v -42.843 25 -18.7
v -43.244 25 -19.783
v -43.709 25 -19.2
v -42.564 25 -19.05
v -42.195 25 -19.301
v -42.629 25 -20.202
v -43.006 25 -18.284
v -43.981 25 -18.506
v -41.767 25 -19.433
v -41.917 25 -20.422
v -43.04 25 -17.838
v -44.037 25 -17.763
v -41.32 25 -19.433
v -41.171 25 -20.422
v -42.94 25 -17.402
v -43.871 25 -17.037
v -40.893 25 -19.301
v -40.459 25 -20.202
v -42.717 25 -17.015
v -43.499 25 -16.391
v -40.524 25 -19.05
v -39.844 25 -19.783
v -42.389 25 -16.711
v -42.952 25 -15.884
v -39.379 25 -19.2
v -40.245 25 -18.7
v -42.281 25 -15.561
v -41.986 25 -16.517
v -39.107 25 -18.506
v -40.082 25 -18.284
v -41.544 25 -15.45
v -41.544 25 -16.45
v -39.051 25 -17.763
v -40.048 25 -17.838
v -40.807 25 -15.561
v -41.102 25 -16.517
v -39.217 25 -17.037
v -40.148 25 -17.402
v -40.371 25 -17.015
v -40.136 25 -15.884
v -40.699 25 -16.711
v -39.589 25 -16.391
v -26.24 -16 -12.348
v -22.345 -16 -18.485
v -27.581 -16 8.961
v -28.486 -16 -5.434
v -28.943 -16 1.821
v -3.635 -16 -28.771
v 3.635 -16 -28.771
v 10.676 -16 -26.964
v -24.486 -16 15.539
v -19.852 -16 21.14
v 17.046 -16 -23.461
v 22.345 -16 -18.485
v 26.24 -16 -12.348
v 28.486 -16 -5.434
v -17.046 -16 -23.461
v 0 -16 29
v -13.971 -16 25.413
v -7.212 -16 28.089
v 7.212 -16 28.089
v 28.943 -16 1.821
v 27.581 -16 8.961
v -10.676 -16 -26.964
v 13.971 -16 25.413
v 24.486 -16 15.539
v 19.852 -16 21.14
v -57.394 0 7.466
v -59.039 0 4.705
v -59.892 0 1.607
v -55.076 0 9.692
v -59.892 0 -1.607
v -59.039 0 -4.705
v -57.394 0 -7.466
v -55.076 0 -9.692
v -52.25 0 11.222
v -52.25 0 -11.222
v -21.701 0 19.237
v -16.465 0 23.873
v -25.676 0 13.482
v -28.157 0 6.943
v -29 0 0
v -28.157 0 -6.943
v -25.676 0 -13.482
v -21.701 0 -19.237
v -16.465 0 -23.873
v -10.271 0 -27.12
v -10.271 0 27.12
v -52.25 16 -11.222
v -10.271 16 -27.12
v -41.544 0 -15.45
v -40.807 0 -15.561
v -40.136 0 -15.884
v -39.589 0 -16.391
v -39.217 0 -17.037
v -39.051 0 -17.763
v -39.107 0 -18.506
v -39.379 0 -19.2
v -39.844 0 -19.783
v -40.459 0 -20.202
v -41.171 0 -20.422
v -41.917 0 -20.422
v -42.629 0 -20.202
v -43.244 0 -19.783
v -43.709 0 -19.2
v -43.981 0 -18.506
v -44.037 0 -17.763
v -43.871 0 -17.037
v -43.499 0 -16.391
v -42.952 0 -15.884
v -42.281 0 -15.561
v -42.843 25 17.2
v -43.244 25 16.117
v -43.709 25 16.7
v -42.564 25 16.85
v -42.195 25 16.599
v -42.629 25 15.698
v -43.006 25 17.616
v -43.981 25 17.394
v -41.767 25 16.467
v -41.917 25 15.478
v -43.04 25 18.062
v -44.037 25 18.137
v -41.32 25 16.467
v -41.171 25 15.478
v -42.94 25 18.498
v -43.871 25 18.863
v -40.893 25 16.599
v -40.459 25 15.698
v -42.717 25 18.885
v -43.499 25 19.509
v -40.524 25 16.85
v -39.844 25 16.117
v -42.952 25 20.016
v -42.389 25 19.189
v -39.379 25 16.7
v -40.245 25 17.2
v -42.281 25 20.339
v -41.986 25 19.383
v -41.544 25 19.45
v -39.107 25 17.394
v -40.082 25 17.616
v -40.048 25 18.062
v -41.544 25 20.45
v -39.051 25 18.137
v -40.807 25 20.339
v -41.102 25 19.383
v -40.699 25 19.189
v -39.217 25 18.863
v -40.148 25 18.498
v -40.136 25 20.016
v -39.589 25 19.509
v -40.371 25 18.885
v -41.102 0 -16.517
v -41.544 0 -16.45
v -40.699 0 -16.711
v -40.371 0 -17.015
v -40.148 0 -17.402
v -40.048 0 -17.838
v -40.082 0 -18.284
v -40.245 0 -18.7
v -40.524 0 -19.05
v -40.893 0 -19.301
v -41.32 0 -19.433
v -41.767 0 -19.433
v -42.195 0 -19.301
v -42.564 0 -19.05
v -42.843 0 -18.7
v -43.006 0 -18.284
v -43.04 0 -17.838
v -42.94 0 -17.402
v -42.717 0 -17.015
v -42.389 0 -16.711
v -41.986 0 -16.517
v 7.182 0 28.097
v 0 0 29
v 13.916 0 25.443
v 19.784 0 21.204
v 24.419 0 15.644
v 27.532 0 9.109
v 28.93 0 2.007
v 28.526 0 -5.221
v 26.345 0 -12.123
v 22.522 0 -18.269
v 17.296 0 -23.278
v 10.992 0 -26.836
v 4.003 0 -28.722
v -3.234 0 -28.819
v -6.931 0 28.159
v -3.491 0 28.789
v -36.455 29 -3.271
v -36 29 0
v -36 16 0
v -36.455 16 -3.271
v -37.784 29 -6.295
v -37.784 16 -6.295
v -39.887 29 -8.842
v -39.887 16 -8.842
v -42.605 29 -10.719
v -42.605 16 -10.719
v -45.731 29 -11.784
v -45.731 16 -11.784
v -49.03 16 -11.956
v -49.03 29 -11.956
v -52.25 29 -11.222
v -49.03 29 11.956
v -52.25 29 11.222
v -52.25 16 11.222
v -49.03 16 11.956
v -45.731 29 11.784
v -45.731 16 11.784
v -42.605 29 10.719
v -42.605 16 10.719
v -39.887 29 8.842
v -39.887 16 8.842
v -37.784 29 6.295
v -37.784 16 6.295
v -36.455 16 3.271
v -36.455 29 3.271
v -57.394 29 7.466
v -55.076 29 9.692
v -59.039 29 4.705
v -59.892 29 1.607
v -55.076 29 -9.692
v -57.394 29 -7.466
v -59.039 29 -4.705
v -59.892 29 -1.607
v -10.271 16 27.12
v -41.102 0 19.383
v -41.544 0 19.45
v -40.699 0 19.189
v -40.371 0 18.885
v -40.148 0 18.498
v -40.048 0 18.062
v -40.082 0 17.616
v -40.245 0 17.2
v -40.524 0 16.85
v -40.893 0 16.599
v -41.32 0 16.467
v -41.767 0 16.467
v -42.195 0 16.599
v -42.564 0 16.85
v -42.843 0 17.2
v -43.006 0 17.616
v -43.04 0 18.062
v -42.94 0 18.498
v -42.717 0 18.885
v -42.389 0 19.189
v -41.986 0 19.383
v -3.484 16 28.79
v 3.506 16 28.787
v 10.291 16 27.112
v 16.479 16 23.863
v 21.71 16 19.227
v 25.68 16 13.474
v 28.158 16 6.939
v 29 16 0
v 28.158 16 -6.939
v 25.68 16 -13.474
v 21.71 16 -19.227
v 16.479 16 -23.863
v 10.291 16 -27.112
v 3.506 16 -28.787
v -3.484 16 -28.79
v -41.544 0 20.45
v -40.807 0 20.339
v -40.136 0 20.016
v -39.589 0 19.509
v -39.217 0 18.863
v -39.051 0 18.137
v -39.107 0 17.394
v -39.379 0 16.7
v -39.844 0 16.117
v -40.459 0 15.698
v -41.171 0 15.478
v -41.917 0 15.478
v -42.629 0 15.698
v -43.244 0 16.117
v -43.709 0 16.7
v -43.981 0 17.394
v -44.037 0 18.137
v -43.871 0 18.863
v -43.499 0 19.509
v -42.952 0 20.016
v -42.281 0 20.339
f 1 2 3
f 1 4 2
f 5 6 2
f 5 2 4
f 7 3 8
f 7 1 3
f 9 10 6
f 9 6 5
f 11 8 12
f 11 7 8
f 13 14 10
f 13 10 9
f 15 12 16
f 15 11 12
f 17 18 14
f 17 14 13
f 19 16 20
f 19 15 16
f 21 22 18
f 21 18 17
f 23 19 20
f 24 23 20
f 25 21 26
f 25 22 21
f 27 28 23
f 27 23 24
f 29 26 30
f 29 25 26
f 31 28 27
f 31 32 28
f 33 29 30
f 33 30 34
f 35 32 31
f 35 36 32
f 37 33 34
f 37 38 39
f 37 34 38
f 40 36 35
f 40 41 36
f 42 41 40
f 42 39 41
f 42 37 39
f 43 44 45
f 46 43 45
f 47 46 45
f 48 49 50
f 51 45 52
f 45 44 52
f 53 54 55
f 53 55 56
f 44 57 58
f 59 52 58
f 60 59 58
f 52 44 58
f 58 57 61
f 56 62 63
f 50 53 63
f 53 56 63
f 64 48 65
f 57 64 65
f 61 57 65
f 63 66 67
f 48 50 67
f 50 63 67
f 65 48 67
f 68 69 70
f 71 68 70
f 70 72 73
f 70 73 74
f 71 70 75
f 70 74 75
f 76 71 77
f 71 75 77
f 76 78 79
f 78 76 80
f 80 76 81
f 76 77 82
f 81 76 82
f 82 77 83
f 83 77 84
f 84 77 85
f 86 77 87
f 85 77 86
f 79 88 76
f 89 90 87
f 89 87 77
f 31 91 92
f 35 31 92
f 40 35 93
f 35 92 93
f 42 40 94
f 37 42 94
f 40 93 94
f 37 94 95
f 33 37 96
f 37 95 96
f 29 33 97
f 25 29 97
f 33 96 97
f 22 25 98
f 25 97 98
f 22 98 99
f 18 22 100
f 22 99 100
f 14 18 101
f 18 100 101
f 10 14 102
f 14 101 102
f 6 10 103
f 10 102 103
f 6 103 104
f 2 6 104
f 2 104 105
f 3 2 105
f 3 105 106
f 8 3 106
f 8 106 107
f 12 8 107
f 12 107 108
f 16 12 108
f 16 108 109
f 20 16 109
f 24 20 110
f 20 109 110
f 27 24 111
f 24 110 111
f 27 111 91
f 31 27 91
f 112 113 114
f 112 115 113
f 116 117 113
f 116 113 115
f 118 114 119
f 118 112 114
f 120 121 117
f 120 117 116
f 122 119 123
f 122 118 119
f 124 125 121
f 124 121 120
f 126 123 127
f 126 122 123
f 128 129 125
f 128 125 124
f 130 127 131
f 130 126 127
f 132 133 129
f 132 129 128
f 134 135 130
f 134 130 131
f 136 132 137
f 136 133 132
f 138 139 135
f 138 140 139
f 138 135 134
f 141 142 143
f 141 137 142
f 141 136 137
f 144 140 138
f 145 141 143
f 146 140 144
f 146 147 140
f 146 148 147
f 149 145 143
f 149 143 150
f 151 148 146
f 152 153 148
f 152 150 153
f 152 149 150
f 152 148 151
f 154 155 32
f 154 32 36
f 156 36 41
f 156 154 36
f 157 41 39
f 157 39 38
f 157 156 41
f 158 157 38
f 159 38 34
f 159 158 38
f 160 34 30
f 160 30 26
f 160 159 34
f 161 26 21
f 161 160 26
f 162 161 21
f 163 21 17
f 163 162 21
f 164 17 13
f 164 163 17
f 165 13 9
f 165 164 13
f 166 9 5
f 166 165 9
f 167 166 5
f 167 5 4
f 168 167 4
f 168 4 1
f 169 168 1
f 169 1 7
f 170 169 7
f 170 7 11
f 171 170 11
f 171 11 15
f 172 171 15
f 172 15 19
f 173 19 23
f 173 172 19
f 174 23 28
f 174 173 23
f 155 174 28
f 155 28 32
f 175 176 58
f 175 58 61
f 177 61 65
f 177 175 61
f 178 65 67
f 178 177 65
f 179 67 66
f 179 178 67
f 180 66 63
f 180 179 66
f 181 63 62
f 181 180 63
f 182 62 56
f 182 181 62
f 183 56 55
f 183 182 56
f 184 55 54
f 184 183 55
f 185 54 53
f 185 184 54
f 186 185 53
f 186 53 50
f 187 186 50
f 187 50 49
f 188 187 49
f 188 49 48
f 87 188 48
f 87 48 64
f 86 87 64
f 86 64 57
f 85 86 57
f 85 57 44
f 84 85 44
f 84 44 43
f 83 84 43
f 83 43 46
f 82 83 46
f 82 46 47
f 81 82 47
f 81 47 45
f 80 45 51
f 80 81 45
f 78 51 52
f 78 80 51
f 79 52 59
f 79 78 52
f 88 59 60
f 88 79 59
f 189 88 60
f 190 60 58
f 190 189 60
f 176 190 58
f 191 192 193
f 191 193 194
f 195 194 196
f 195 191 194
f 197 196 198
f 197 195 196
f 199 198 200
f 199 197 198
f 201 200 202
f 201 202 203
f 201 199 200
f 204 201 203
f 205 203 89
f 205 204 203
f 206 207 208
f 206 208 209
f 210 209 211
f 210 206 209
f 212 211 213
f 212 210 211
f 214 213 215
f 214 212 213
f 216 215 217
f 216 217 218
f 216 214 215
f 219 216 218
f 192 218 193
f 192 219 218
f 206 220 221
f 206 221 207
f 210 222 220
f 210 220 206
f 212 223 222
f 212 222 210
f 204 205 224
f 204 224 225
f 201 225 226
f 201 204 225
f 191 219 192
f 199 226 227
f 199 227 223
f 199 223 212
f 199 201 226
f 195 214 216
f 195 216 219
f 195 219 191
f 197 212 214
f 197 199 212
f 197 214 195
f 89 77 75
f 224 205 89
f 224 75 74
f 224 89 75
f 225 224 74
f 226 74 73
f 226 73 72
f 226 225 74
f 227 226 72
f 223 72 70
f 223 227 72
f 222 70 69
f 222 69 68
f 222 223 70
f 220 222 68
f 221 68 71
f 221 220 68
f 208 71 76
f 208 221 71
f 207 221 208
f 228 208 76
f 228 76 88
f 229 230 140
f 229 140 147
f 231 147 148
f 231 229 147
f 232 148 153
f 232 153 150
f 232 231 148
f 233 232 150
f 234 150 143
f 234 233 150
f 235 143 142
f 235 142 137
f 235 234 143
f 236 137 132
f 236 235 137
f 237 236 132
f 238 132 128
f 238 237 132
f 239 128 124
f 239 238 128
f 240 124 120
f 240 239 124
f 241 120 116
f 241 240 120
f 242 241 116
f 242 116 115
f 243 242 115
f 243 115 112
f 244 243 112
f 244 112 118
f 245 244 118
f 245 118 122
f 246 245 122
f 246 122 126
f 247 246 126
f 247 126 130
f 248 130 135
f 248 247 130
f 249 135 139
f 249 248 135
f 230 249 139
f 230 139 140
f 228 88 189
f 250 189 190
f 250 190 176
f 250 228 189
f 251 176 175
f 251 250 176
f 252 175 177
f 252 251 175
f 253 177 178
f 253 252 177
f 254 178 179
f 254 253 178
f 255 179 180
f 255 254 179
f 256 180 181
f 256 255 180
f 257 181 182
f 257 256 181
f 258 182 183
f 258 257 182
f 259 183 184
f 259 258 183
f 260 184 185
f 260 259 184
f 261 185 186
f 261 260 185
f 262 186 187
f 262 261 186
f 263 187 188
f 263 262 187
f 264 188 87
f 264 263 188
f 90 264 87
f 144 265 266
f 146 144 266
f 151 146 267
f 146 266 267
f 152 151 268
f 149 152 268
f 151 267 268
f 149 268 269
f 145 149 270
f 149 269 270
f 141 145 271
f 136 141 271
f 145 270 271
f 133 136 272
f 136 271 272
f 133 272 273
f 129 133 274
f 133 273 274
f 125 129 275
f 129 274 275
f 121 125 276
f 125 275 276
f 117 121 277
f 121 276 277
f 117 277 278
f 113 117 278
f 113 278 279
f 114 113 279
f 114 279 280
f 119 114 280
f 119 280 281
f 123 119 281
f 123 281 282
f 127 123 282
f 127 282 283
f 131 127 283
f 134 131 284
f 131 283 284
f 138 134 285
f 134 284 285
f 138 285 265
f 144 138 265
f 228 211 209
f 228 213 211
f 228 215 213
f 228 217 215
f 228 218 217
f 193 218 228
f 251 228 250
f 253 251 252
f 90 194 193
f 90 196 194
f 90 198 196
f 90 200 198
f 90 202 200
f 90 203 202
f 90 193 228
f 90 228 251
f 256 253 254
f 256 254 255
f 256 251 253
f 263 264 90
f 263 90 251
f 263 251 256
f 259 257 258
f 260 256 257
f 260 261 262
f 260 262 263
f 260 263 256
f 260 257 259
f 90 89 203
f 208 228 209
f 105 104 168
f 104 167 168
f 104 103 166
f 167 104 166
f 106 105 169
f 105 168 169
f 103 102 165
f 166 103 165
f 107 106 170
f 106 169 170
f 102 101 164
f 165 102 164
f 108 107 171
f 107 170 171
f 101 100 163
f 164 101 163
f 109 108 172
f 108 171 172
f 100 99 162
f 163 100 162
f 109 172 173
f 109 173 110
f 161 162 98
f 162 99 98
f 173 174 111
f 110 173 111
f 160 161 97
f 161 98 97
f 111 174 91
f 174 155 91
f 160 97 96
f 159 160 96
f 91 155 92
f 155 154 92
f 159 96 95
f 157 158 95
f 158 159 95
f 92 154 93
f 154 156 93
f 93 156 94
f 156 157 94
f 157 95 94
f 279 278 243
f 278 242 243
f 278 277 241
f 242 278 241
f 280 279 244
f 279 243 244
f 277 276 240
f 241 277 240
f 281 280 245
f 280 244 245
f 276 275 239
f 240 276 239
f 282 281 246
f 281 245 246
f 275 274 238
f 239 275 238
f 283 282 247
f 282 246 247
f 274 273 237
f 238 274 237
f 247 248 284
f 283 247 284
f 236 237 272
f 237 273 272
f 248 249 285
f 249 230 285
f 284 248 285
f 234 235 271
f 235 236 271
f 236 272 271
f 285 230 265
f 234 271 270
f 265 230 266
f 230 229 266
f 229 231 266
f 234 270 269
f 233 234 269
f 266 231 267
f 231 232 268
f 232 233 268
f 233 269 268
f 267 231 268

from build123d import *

# Parameters (mm, degrees)
SKETCH_1_R        = 29
EXTRUDE_1_DEPTH   = 16
EXTRUDE_START     = 16
EXTRUDE_2_DEPTH   = 16
EXTRUDE_START_2   = 13
EXTRUDE_3_DEPTH   = 13
EXTRUDE_START_3   = -16
SKETCH_4_R        = 2.5
SKETCH_4_R_2      = 1.5
EXTRUDE_4_DEPTH   = 25
EXTRUDE_4_2_DEPTH = 25


with BuildPart() as part:
    # 草图1 → 凸台-拉伸1 (new body)
    with BuildSketch(Plane(origin=(0, 0, 0), x_dir=(1, 0, 0), z_dir=(0, 1, 0))):
        with Locations(Location((0, 0, 0), (0, 0, 270))):
            Circle(SKETCH_1_R)
    extrude(amount=-EXTRUDE_1_DEPTH)

    # 草图2 → 凸台-拉伸2 (add)
    with BuildSketch(Plane(origin=(0, 0, 0), x_dir=(1, 0, 0), z_dir=(0, 1, 0)).offset(EXTRUDE_START)):
        with BuildLine():
            Line((-10.270833333, 27.120287289), (-52.25, 11.222187844))
            ThreePointArc((-52.25, 11.222187844), (-60, 0), (-52.25, -11.222187844))
            Line((-52.25, -11.222187844), (-10.270833333, -27.120287289))
            ThreePointArc((-10.270833333, -27.120287289), (29, 0), (-10.270833333, 27.120287289))
        make_face()
    extrude(amount=-EXTRUDE_2_DEPTH)

    # 草图3 → 凸台-拉伸3 (add)
    with BuildSketch(Plane(origin=(0, 16, 0), x_dir=(1, 0, 0), z_dir=(0, 1, 0)).offset(EXTRUDE_START_2)):
        with BuildLine():
            ThreePointArc((-36, 0), (-41.180909152, 9.874208829), (-52.25, 11.222187844))
            ThreePointArc((-52.25, 11.222187844), (-60, 0), (-52.25, -11.222187844))
            ThreePointArc((-52.25, -11.222187844), (-41.180909152, -9.874208829), (-36, 0))
        make_face()
    extrude(amount=-EXTRUDE_3_DEPTH)


with BuildPart() as body_2:
    # 草图4 → 凸台-拉伸4 (new body)
    with BuildSketch(Plane(origin=(0, 16, 0), x_dir=(1, 0, 0), z_dir=(0, 1, 0)).offset(EXTRUDE_START_3)):
        with Locations(Location((-41.543936048, -17.95, 0), (0, 0, 270))):
            Circle(SKETCH_4_R)
        with Locations(Location((-41.543936048, -17.95, 0), (0, 0, 270))):
            Circle(SKETCH_4_R_2, mode=Mode.SUBTRACT)
    extrude(amount=EXTRUDE_4_DEPTH)


with BuildPart() as body_3:
    # 草图4 → Extrude 4 2 (new body)
    with BuildSketch(Plane(origin=(0, 16, 0), x_dir=(1, 0, 0), z_dir=(0, 1, 0)).offset(EXTRUDE_START_3)):
        with Locations(Location((-41.543936048, 17.95, 0), (0, 0, 270))):
            Circle(SKETCH_4_R)
        with Locations(Location((-41.543936048, 17.95, 0), (0, 0, 270))):
            Circle(SKETCH_4_R_2, mode=Mode.SUBTRACT)
    extrude(amount=EXTRUDE_4_2_DEPTH)


solid = Compound([part.part, body_2.part, body_3.part])
